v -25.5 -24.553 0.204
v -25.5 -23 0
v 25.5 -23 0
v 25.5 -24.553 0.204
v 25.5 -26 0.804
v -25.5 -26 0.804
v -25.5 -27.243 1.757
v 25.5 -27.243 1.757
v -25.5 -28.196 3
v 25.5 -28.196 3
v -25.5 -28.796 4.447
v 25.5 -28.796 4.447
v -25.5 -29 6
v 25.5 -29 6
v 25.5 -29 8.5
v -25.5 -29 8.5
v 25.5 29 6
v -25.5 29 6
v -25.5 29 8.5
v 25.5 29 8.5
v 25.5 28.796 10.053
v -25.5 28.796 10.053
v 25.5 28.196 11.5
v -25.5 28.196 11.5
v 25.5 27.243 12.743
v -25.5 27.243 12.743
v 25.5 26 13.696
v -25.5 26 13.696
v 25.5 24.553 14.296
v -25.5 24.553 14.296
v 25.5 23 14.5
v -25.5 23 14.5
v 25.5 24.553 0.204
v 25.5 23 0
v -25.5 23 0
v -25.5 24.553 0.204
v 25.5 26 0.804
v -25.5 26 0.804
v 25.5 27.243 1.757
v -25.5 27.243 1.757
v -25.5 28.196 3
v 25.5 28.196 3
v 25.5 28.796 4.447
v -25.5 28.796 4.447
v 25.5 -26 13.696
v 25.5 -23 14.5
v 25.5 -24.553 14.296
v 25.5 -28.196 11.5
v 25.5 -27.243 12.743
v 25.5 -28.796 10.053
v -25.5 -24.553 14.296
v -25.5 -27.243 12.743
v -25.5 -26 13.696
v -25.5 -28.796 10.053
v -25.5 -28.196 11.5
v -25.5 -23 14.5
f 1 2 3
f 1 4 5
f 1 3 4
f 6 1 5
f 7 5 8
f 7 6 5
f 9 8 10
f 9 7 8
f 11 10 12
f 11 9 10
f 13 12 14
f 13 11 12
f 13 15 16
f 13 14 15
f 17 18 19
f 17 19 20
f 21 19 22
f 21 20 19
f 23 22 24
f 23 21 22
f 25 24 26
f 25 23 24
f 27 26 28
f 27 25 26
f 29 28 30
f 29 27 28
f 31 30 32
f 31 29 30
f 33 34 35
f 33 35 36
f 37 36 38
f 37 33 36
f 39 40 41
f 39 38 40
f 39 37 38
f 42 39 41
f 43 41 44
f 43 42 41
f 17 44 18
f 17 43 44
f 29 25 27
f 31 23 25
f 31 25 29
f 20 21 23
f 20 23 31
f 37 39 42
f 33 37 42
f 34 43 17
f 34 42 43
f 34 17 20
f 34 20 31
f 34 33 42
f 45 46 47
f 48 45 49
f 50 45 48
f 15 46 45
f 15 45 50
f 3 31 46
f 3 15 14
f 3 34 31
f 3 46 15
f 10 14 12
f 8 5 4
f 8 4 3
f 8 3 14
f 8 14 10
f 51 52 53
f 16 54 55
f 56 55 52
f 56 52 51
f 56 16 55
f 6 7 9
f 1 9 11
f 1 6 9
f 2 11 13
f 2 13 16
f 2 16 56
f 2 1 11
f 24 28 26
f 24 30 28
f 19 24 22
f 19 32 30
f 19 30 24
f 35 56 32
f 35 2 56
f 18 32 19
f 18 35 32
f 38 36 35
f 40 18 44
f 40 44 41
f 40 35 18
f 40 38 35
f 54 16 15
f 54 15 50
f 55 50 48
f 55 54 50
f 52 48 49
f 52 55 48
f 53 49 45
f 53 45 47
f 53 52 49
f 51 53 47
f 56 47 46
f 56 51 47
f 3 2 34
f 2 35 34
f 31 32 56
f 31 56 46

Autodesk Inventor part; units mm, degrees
ref_plane "YZ Plane" through (0, 0, 0) normal (1, 0, 0) x (0, 1, 0)
ref_plane "XZ Plane" through (0, 0, 0) normal (0, 1, 0) x (-1, 0, 0)
ref_plane "XY Plane" through (0, 0, 0) normal (0, 0, 1) x (1, 0, 0)
sketch "スケッチ1" plane through (0, 0, 0) normal (0, 0, 1) x (1, 0, 0)
  line L0 (-25.5, 29) -> (25.5, 29)
  line L1 (25.5, 29) -> (25.5, -29)
  line L2 (25.5, -29) -> (-25.5, -29)
  line L3 (-25.5, -29) -> (-25.5, 29)
  point P0 (0, 0)
  point P1 (-25.5, 0)
  point P2 (0, -29)
  dimension "d0" = 51
  dimension "d1" = 58
extrude "押し出し1" add sketch "スケッチ1" along normal blind 14.5
fillet "フィレット1" radius 6 4 edges at (0, 29, 14.5) (0, 29, 0) (0, -29, 14.5) (0, -29, 0)
properties part number "AA-Cellx4"
